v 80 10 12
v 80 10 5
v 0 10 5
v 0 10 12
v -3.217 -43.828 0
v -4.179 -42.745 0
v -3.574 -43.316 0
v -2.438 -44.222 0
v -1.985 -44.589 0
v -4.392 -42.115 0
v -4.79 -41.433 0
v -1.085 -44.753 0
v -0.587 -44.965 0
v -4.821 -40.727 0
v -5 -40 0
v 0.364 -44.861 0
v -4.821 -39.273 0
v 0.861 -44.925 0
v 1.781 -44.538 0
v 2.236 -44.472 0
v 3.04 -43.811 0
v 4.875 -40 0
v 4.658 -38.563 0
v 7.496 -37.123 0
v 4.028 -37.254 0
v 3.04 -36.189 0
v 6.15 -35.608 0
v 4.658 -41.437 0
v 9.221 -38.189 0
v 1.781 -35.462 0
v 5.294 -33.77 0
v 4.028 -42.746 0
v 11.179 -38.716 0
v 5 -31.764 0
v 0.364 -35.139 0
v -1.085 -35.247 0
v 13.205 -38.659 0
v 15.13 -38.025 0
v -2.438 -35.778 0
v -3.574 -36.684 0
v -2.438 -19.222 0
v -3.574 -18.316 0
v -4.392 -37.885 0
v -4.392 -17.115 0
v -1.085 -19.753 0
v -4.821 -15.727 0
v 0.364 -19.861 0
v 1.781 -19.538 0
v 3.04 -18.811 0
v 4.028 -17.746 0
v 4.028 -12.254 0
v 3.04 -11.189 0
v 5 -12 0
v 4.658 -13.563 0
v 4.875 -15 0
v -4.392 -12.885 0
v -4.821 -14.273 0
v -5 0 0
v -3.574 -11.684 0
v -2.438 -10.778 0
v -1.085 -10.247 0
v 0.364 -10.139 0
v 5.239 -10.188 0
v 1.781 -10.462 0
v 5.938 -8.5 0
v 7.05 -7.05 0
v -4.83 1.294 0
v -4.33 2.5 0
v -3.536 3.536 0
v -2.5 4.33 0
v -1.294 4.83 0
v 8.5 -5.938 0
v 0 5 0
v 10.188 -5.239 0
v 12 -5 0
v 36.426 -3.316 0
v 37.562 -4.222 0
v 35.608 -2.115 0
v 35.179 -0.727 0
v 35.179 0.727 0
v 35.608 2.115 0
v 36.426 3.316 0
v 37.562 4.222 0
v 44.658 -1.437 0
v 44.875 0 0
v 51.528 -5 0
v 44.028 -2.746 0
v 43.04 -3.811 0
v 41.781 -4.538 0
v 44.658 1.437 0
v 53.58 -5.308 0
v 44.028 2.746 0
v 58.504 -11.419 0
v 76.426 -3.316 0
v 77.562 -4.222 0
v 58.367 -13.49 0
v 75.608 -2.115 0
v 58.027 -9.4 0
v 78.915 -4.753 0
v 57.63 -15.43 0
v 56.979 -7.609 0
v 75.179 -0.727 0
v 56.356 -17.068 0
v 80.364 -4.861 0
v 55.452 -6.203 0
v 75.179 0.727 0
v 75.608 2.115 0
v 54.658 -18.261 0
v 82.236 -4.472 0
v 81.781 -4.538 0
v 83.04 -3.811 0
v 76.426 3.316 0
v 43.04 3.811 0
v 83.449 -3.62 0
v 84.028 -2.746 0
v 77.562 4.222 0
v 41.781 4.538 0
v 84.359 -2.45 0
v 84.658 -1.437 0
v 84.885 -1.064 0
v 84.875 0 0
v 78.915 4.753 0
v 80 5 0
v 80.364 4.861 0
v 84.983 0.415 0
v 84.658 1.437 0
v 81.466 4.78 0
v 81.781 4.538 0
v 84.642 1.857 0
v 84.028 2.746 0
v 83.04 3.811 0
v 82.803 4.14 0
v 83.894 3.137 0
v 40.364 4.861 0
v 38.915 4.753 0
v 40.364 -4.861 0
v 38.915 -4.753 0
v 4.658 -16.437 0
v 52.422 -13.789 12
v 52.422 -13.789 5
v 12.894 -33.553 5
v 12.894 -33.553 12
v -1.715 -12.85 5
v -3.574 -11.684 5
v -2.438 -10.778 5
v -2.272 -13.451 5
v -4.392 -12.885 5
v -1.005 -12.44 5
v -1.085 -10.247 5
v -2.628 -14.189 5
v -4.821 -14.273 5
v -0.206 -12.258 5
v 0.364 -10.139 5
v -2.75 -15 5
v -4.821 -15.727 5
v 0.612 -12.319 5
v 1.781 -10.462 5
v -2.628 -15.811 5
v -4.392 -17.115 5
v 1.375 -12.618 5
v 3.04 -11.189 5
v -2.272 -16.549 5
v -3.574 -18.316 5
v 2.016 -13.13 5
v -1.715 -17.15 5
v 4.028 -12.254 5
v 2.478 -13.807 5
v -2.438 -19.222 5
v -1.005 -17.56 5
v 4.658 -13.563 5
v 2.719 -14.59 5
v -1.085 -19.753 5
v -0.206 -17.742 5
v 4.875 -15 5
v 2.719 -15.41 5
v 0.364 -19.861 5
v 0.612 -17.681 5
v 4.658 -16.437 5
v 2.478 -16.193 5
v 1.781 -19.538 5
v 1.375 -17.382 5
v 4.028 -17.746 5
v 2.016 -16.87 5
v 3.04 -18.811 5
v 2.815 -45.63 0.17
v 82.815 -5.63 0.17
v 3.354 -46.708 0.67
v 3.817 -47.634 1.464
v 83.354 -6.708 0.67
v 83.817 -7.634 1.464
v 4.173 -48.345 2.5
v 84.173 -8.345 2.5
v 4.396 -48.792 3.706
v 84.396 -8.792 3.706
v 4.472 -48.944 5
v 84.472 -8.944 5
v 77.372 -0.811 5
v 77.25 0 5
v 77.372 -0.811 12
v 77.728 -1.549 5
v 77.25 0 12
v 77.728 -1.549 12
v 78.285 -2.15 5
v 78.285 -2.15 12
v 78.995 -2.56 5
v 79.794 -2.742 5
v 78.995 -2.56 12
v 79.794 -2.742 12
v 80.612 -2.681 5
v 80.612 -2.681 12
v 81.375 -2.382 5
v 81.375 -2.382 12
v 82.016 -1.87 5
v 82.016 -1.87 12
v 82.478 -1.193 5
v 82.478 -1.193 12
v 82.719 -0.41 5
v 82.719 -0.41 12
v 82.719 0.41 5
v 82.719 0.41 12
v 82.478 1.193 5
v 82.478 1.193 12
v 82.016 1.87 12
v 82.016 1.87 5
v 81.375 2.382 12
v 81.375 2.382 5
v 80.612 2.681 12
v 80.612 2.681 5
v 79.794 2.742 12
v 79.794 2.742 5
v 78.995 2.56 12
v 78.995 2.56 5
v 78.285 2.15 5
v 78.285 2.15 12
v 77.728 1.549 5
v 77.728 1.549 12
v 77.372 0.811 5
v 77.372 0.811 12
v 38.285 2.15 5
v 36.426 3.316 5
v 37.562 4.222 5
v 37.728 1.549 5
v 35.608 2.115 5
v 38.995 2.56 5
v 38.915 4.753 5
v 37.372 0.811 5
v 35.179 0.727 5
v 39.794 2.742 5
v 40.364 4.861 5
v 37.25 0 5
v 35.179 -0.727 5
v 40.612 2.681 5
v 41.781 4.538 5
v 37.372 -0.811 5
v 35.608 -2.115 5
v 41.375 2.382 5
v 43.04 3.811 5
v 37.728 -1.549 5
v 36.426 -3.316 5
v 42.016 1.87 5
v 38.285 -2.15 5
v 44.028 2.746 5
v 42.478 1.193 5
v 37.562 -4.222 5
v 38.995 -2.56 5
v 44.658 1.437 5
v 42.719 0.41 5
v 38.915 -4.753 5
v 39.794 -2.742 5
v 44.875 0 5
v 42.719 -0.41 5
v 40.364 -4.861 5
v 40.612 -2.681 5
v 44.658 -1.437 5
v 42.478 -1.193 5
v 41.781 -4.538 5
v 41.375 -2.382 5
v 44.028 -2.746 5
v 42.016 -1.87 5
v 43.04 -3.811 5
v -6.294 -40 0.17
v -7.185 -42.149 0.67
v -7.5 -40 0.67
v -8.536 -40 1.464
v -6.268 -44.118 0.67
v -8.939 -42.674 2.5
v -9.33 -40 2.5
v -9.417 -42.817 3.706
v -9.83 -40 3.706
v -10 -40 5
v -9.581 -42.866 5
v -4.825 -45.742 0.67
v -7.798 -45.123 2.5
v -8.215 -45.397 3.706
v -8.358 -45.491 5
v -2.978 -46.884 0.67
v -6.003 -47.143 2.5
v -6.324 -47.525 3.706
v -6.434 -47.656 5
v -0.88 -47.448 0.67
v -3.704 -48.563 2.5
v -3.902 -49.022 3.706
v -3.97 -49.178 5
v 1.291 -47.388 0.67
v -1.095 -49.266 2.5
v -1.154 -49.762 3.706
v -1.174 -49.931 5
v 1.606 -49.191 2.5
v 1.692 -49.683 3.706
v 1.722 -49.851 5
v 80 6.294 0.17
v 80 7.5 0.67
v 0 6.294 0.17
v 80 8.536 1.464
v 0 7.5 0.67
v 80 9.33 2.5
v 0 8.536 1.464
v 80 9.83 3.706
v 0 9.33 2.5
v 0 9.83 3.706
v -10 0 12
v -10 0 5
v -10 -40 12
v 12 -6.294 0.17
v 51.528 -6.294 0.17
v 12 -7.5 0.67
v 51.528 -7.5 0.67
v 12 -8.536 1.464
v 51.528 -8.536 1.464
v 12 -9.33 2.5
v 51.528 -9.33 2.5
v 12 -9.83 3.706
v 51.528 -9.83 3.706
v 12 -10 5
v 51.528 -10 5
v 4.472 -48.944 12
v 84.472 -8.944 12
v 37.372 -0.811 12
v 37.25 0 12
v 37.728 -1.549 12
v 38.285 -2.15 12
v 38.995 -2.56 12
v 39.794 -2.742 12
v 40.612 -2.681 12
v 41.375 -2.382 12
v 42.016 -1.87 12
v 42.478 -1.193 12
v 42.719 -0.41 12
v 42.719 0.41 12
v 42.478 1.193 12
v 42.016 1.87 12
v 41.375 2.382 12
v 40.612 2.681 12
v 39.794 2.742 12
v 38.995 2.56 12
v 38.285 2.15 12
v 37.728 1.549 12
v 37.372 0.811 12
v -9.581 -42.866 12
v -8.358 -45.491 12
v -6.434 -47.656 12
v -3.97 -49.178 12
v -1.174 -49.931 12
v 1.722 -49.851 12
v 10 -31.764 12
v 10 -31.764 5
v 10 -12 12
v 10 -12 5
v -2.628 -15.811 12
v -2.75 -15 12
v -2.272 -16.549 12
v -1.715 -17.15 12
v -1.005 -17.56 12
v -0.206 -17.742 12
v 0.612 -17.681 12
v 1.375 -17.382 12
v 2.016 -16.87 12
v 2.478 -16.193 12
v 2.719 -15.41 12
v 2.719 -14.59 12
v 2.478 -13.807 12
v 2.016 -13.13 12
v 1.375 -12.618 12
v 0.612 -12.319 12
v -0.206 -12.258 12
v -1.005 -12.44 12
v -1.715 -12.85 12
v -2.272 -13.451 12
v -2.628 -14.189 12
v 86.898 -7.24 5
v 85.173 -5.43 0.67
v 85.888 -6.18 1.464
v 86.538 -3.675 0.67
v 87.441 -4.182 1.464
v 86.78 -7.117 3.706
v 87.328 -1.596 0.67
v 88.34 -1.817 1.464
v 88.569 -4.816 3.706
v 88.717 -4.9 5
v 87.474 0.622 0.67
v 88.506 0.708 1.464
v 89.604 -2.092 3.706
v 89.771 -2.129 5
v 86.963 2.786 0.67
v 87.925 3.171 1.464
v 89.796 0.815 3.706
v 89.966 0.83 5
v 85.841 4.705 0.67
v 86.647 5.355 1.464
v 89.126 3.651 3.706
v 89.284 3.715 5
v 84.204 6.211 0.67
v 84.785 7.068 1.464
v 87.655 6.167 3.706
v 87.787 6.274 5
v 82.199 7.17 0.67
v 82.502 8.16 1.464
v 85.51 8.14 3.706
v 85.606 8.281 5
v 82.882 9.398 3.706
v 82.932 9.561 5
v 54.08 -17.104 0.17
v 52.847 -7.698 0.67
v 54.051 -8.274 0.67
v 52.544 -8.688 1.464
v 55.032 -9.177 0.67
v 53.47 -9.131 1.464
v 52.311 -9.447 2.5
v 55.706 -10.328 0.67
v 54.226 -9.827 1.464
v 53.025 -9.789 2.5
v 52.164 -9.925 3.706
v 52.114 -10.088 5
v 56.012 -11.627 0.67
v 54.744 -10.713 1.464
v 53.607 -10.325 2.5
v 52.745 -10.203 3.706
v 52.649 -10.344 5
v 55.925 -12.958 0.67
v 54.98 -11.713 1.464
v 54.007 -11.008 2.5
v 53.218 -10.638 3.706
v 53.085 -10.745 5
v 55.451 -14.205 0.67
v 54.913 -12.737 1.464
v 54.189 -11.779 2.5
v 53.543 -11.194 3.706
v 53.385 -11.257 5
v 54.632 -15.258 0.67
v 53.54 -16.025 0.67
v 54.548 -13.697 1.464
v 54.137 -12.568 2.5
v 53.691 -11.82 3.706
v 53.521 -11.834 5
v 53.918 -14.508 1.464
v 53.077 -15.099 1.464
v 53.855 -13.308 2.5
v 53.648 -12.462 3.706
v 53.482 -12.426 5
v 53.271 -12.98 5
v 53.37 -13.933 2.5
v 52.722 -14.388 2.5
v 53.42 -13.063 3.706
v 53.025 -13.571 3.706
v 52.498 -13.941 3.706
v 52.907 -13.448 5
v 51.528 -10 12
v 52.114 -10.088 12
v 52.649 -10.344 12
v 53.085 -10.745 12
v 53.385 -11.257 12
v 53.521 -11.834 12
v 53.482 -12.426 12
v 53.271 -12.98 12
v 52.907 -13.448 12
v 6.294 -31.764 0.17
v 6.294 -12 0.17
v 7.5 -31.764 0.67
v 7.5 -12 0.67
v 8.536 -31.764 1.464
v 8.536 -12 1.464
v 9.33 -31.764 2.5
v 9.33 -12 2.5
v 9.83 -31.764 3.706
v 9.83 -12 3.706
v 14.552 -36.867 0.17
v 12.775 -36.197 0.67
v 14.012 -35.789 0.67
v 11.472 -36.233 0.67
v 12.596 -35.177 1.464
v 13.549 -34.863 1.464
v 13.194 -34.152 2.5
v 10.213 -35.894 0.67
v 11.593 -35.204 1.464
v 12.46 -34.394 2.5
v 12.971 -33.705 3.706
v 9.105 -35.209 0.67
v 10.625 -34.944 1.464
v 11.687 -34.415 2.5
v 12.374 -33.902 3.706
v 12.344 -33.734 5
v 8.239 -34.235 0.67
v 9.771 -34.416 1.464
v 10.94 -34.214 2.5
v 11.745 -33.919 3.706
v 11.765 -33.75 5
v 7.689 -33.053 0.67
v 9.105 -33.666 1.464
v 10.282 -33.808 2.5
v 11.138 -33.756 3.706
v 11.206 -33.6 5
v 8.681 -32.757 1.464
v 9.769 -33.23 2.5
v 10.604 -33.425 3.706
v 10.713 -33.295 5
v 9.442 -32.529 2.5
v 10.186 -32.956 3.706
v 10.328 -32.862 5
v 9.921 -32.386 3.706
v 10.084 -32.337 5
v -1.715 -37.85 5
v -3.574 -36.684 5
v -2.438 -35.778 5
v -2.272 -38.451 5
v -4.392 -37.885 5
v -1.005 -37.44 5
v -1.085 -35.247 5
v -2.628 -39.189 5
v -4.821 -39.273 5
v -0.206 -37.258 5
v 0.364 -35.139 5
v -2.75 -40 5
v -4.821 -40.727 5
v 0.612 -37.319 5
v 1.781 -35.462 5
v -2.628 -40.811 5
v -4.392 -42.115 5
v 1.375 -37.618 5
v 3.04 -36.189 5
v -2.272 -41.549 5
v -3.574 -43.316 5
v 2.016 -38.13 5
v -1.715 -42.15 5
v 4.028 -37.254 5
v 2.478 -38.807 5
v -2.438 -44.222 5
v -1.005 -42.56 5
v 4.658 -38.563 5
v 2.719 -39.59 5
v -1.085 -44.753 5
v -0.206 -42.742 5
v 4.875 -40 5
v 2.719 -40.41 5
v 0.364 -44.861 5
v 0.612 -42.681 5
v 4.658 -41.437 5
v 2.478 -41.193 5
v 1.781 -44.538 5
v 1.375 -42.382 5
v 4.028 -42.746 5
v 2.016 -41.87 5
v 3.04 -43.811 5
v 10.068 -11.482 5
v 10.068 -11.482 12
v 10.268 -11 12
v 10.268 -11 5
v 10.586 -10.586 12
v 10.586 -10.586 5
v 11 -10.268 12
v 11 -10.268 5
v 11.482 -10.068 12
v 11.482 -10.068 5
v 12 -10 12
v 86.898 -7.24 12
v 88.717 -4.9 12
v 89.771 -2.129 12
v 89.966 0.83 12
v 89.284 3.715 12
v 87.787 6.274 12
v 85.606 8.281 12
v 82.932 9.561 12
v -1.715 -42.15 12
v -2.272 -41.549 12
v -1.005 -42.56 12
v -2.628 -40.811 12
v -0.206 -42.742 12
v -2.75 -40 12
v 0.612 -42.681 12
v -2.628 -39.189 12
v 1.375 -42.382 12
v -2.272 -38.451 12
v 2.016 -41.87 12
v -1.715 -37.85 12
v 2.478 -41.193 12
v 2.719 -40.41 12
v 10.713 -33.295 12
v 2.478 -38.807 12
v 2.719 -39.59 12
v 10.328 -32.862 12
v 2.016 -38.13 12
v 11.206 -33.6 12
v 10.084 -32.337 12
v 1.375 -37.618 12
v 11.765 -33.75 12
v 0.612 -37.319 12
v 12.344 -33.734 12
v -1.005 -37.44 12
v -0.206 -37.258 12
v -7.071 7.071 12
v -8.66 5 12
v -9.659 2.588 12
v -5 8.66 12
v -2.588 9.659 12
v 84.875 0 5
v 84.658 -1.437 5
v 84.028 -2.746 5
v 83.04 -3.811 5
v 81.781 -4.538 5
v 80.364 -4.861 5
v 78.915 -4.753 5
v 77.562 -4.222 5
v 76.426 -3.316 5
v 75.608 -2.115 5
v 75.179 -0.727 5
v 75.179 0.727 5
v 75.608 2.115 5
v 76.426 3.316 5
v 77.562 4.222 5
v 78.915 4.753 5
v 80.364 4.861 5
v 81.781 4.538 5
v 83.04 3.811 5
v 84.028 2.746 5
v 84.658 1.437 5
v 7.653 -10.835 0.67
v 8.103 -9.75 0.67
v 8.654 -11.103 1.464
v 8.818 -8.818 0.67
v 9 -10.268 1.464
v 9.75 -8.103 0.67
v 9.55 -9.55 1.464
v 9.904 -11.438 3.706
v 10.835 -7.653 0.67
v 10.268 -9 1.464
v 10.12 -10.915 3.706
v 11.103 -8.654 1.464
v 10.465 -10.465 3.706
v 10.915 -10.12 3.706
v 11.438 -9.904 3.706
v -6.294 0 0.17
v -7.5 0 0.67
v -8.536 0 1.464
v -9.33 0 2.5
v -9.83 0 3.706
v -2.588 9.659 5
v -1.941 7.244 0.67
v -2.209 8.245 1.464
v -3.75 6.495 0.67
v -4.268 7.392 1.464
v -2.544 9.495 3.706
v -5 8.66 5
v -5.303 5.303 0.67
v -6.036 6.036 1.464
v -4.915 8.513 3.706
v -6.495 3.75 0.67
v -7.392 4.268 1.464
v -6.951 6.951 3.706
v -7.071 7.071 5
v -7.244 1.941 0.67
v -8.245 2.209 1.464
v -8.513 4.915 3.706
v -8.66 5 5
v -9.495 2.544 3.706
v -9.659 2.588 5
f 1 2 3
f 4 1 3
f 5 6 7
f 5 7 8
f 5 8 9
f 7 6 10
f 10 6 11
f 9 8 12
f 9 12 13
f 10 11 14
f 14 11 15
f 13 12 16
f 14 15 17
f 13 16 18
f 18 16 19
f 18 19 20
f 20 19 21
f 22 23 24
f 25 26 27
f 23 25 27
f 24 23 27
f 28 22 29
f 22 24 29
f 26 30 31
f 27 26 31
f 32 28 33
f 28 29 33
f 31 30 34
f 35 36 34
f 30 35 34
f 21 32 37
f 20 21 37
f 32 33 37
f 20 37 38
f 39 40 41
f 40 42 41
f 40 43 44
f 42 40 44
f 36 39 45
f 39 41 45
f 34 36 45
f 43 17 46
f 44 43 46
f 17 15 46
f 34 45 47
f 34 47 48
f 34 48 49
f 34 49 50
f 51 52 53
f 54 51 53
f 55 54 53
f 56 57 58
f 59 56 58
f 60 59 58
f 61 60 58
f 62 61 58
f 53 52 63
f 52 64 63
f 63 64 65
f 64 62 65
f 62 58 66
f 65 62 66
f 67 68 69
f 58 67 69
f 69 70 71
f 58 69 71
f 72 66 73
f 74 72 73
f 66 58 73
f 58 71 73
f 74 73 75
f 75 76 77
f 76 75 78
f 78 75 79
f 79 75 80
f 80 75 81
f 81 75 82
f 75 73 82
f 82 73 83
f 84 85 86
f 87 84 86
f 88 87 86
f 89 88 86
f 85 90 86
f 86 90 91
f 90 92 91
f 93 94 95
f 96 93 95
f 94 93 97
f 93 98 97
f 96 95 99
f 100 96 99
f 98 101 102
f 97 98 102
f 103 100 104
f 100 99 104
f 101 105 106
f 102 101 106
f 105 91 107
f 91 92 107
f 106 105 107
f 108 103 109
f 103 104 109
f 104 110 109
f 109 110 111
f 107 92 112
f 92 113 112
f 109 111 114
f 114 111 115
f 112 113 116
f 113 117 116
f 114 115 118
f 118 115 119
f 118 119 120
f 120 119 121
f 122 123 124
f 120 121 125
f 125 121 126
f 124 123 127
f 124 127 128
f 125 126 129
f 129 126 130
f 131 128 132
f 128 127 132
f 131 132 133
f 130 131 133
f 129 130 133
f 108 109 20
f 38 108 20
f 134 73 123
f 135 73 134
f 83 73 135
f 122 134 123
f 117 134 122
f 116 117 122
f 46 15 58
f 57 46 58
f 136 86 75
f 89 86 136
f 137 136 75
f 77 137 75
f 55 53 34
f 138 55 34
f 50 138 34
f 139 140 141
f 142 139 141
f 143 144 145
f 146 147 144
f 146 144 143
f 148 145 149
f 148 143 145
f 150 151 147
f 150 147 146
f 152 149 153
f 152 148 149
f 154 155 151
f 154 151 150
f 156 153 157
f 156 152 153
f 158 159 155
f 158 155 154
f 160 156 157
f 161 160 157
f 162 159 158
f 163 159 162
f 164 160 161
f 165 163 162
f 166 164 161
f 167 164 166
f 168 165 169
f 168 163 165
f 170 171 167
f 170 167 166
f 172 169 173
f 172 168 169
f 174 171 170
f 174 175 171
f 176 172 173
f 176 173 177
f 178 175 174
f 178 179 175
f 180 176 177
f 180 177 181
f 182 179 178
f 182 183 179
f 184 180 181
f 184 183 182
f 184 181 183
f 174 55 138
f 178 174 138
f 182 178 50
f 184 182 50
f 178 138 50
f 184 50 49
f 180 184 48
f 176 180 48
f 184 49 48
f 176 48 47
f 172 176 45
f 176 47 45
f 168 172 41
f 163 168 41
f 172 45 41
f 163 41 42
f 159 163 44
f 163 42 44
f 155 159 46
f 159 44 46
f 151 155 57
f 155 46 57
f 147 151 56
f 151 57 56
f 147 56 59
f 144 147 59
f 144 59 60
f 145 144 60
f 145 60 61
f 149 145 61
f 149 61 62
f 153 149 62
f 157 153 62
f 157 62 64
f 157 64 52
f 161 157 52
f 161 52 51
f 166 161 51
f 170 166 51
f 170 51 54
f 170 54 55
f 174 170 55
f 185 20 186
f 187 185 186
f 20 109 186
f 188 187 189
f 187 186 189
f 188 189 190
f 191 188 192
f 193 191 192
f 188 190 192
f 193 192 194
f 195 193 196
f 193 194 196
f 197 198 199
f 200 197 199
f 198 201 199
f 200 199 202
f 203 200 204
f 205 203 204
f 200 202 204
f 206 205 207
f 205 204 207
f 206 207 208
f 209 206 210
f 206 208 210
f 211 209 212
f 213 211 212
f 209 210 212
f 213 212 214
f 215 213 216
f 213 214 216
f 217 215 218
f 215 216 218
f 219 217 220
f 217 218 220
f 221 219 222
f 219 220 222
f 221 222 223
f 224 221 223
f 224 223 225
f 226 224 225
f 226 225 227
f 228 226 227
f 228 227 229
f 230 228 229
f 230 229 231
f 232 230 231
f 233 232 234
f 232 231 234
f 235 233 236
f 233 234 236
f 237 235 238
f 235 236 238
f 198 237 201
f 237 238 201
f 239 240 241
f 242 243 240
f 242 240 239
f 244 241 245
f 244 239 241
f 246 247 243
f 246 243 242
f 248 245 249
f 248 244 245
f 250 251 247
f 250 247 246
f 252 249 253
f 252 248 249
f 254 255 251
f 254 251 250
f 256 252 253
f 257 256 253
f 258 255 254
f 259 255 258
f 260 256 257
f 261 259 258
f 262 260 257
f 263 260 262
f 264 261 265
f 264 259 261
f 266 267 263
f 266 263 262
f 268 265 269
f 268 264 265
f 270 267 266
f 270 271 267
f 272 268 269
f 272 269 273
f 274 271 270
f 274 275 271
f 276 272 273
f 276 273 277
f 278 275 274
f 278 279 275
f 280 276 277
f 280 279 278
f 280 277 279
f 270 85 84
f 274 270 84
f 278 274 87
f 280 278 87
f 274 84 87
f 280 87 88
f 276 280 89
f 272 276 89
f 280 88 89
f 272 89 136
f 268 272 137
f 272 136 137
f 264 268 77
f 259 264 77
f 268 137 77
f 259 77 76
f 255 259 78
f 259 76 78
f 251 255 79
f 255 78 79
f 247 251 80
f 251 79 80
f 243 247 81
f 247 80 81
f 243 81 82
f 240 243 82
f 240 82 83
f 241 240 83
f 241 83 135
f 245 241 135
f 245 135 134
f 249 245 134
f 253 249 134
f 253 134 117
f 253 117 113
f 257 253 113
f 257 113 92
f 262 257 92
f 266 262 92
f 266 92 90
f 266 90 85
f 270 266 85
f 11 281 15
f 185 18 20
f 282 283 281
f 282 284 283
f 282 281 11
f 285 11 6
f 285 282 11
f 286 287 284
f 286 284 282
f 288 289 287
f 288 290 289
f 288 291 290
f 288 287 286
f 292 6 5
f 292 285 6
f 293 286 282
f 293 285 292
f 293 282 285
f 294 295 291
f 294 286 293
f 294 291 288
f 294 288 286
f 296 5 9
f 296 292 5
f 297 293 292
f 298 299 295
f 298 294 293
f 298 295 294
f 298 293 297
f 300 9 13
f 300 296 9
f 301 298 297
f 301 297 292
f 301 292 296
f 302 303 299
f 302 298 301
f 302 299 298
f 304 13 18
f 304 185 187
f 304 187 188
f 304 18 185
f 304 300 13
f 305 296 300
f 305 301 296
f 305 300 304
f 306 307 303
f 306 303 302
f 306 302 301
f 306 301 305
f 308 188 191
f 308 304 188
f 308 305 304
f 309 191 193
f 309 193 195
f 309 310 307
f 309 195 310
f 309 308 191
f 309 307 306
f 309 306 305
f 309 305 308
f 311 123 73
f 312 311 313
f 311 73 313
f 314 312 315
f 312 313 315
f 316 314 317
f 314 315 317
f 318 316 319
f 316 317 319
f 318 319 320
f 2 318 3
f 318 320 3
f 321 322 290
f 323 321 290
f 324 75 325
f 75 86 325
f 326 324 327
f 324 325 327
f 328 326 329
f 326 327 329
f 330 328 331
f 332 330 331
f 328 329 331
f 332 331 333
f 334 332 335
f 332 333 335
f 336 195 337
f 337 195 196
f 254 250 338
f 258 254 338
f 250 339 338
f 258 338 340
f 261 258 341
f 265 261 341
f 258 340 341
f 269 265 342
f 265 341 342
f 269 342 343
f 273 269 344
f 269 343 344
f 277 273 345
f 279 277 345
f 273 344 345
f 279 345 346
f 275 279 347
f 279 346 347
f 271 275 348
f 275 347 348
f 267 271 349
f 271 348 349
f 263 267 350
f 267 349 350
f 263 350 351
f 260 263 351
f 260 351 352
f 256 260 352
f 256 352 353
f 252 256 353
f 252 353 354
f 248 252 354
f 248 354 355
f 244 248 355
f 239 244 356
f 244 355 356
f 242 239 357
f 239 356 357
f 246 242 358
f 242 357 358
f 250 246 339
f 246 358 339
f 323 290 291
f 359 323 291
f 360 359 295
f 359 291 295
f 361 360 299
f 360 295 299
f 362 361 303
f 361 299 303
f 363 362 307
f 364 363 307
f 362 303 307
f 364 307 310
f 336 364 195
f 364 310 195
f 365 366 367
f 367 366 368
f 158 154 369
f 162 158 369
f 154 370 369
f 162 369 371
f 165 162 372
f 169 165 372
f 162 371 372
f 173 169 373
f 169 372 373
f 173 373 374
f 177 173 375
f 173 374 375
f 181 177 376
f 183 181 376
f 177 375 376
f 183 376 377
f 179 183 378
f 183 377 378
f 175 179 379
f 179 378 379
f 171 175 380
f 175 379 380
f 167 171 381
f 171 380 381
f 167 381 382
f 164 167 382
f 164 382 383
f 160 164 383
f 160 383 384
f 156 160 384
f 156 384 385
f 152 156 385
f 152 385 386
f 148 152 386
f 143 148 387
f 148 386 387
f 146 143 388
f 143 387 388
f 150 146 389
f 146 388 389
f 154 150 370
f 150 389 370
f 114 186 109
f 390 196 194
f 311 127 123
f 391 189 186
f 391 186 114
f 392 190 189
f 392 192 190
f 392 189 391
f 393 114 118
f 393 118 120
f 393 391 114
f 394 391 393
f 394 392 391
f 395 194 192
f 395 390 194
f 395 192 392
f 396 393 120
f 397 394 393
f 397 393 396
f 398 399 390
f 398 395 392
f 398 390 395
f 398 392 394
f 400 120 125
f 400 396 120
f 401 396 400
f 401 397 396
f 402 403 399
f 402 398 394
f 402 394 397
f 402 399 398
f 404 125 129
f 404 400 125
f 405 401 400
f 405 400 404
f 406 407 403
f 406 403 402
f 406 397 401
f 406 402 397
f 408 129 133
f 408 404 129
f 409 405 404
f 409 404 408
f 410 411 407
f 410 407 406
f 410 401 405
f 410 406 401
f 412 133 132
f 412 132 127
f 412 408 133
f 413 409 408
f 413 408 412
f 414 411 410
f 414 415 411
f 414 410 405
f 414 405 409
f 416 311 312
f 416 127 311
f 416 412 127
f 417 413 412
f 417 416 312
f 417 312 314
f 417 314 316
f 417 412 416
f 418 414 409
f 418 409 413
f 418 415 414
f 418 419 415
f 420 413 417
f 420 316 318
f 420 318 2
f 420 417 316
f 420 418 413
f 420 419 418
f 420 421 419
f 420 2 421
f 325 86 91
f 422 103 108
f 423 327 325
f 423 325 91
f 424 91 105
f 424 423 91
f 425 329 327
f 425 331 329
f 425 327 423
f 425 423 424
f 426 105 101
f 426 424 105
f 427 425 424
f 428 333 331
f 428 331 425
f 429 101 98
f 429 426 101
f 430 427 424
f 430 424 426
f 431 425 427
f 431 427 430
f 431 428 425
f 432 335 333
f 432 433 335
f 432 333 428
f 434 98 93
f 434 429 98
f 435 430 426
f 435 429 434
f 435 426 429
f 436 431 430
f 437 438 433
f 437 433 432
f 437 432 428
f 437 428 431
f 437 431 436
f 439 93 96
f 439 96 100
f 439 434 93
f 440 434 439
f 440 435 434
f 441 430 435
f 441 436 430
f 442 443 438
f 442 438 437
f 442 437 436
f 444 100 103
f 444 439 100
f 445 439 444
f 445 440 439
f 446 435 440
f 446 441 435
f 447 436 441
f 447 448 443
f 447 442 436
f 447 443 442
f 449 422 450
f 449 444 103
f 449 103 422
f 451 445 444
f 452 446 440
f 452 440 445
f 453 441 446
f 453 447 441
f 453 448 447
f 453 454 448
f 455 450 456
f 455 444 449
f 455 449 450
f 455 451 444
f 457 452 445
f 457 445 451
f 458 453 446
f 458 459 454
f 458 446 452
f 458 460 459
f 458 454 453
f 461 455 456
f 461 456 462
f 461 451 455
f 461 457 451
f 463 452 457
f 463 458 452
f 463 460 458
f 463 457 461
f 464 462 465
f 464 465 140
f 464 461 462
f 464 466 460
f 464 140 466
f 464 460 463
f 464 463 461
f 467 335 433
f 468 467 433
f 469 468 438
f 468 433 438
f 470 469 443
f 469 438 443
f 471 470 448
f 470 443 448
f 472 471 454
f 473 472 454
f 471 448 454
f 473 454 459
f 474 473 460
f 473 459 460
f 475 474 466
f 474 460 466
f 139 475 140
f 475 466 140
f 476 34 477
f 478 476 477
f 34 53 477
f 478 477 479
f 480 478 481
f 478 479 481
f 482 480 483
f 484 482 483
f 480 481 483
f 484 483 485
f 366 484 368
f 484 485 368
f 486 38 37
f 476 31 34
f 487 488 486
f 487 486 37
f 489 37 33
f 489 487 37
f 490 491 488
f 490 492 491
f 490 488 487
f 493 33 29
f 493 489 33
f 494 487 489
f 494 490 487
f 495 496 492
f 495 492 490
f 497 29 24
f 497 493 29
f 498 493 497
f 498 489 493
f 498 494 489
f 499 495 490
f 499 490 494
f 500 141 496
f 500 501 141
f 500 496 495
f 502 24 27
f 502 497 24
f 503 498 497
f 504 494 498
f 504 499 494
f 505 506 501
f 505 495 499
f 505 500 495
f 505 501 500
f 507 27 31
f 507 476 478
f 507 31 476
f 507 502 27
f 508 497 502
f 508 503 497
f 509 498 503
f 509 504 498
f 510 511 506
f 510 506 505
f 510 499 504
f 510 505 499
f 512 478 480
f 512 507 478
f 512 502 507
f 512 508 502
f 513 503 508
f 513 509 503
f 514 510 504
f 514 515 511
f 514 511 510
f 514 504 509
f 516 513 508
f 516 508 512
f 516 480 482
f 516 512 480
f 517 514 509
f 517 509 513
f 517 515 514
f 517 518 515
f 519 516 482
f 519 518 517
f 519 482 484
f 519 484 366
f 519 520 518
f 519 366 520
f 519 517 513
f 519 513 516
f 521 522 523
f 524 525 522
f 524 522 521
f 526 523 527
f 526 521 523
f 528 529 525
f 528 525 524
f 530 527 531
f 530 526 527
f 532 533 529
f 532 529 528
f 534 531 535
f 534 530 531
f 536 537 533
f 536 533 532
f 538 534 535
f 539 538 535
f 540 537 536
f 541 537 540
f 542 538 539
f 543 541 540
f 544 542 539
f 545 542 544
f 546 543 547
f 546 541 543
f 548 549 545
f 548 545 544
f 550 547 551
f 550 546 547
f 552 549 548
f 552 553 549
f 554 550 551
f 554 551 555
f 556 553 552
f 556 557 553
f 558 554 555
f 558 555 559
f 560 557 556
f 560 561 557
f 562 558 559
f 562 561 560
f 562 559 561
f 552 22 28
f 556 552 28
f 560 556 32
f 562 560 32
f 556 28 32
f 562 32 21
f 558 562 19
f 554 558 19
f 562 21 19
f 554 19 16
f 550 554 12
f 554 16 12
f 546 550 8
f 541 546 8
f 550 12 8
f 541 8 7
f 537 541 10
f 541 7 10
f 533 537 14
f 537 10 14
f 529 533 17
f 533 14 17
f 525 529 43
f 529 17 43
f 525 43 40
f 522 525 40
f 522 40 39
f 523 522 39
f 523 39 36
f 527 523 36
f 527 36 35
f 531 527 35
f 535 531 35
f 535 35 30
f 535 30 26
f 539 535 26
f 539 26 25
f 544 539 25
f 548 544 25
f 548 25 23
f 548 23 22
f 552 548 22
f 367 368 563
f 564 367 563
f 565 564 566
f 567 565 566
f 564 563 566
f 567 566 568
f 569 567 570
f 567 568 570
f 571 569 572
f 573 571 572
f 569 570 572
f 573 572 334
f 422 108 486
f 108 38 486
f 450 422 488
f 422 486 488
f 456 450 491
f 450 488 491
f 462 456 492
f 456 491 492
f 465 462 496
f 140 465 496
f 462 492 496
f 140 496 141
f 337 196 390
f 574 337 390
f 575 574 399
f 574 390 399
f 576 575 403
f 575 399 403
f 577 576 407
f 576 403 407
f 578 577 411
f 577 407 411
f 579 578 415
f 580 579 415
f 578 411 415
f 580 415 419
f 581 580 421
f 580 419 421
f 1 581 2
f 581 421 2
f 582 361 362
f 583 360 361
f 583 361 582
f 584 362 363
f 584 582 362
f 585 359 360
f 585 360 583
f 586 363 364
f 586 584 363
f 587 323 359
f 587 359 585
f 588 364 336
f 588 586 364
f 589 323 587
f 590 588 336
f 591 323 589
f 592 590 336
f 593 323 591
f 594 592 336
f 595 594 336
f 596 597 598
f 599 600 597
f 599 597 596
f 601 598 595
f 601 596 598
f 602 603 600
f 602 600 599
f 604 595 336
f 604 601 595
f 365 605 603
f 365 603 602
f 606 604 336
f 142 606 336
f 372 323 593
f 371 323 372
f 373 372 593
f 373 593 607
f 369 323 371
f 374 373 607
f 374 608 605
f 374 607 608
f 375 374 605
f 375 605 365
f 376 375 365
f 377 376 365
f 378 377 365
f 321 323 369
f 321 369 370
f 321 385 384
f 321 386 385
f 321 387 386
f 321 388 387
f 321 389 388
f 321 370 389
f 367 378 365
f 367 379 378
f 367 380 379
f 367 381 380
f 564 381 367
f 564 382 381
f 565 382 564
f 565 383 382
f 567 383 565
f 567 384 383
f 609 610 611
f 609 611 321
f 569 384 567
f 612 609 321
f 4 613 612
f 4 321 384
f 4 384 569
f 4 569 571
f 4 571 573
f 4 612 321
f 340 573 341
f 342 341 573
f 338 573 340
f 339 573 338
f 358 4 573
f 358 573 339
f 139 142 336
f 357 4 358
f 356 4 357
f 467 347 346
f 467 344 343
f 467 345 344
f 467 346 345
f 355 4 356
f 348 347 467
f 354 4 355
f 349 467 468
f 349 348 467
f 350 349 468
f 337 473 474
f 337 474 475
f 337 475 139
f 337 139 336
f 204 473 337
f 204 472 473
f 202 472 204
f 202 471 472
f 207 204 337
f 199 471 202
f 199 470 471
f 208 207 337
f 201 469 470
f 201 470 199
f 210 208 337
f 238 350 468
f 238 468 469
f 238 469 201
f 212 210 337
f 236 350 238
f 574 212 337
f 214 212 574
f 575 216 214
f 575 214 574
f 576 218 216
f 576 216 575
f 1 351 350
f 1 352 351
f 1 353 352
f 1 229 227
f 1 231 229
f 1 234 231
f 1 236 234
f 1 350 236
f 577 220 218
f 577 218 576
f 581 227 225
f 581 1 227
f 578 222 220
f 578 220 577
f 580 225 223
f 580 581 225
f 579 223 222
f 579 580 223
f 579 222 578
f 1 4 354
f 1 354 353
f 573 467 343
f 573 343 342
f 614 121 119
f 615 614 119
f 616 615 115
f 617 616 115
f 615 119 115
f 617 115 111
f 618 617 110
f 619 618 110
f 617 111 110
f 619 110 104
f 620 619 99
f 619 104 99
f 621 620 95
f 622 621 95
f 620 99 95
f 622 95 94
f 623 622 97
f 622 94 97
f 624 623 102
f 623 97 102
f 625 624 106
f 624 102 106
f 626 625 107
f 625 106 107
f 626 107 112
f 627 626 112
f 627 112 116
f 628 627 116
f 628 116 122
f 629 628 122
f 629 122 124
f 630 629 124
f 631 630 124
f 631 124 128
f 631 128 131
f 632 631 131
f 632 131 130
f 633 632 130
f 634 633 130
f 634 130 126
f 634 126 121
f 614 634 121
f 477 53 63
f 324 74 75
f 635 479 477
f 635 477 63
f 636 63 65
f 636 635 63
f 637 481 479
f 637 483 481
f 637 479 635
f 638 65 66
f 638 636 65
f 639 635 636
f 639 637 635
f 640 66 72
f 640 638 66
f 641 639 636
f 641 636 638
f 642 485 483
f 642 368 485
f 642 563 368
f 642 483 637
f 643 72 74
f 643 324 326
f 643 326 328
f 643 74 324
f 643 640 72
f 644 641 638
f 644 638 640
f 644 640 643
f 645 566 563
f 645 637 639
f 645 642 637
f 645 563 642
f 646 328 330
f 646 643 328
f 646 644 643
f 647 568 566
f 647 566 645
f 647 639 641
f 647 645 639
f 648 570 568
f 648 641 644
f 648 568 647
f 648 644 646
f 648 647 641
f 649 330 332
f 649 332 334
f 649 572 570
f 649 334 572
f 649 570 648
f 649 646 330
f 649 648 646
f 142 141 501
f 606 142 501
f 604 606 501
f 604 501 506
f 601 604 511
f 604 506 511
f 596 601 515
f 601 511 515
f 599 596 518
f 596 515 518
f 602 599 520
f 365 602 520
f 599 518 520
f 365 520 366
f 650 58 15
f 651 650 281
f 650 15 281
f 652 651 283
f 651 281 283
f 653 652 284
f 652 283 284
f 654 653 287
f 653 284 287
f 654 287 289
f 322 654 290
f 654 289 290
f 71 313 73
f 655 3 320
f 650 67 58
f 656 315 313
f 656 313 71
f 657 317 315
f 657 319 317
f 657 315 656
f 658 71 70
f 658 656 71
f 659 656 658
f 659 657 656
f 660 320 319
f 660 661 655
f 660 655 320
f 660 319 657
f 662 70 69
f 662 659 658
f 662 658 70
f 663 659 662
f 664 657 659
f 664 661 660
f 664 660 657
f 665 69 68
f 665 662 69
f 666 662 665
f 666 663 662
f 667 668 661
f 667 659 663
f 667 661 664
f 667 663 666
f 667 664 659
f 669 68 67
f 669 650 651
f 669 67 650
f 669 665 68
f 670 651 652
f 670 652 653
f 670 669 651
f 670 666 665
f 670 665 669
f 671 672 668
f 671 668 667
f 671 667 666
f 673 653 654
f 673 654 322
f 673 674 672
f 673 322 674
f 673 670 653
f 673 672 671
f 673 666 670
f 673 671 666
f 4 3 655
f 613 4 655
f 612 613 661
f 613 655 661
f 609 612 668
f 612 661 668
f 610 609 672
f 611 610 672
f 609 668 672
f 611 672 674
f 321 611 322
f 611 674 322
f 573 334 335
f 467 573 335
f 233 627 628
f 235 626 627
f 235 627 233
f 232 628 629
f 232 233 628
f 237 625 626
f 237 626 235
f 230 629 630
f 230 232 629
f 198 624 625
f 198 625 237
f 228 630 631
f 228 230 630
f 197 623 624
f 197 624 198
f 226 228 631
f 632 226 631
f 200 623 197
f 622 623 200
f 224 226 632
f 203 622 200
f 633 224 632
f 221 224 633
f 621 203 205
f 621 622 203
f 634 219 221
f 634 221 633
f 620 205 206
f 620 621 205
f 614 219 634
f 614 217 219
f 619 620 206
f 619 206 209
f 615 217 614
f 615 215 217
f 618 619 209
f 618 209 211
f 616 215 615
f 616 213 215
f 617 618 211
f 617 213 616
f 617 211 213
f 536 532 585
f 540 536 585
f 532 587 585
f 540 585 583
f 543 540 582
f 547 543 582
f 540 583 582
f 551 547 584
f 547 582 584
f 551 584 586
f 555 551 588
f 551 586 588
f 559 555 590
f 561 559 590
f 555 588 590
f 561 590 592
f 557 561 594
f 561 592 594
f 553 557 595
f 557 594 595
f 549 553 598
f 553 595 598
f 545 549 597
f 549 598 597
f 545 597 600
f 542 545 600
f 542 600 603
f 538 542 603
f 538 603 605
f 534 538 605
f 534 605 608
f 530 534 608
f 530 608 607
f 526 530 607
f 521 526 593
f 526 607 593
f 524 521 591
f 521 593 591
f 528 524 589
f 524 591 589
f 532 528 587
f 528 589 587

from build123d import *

# Parameters (mm, degrees)
F1_DEPTH       = 12
F2_D           = 5.5
F2_CBORE_D     = 9.75
F2_CBORE_DEPTH = 5
F3_R           = 4.99999


# Not quite as in the source:
# - a fillet or chamfer is up to 0.001 mm smaller than in the source, because OpenCascade refuses the exact size


with BuildPart() as f1:
    # F0 (on Top) → F1 (new body)
    with BuildSketch(Plane.XY):
        with BuildLine():
            Line((80, 10), (0, 10))
            ThreePointArc((0, 10), (-7.0710678119, 7.0710678119), (-10, 0))
            Line((-10, 0), (-10, -40))
            ThreePointArc((-10, -40), (-5.2573111212, -48.5065080835), (4.472135955, -48.94427191))
            Line((4.472135955, -48.94427191), (84.472135955, -8.94427191))
            ThreePointArc((84.472135955, -8.94427191), (89.7324898947, 2.2975292055), (80, 10))
        make_face()
        with BuildLine():
            ThreePointArc((51.527864045, -10), (53.4743620239, -11.5404941589), (52.422291236, -13.788854382))
            Line((52.422291236, -13.788854382), (12.894427191, -33.5527864045))
            ThreePointArc((12.894427191, -33.5527864045), (10.9485377758, -33.4652336392), (10, -31.7639320225))
            Line((10, -31.7639320225), (10, -12))
            ThreePointArc((10, -12), (10.5857864376, -10.5857864376), (12, -10))
            Line((12, -10), (51.527864045, -10))
        make_face(mode=Mode.SUBTRACT)
    extrude(amount=F1_DEPTH)

    # F2 (through all)
    with Locations(Plane(origin=(0, 0, 0), x_dir=(1, 0, 0), z_dir=(0, 0, -1))):
        with Locations((80, 0), (0, 40), (40, 0), (0, 15)):
            CounterBoreHole(F2_D / 2, F2_CBORE_D / 2, F2_CBORE_DEPTH)

    # F3 (radius 5 in the source; OpenCascade refuses exactly that, so slightly less here)
    f3_edges = [f1.edges().sort_by_distance(p)[0] for p in [
        (44.472136, -28.944272, 0),
        (31.763932, -10, 0),
    ]]
    fillet(f3_edges, radius=F3_R)


solid = f1.part
